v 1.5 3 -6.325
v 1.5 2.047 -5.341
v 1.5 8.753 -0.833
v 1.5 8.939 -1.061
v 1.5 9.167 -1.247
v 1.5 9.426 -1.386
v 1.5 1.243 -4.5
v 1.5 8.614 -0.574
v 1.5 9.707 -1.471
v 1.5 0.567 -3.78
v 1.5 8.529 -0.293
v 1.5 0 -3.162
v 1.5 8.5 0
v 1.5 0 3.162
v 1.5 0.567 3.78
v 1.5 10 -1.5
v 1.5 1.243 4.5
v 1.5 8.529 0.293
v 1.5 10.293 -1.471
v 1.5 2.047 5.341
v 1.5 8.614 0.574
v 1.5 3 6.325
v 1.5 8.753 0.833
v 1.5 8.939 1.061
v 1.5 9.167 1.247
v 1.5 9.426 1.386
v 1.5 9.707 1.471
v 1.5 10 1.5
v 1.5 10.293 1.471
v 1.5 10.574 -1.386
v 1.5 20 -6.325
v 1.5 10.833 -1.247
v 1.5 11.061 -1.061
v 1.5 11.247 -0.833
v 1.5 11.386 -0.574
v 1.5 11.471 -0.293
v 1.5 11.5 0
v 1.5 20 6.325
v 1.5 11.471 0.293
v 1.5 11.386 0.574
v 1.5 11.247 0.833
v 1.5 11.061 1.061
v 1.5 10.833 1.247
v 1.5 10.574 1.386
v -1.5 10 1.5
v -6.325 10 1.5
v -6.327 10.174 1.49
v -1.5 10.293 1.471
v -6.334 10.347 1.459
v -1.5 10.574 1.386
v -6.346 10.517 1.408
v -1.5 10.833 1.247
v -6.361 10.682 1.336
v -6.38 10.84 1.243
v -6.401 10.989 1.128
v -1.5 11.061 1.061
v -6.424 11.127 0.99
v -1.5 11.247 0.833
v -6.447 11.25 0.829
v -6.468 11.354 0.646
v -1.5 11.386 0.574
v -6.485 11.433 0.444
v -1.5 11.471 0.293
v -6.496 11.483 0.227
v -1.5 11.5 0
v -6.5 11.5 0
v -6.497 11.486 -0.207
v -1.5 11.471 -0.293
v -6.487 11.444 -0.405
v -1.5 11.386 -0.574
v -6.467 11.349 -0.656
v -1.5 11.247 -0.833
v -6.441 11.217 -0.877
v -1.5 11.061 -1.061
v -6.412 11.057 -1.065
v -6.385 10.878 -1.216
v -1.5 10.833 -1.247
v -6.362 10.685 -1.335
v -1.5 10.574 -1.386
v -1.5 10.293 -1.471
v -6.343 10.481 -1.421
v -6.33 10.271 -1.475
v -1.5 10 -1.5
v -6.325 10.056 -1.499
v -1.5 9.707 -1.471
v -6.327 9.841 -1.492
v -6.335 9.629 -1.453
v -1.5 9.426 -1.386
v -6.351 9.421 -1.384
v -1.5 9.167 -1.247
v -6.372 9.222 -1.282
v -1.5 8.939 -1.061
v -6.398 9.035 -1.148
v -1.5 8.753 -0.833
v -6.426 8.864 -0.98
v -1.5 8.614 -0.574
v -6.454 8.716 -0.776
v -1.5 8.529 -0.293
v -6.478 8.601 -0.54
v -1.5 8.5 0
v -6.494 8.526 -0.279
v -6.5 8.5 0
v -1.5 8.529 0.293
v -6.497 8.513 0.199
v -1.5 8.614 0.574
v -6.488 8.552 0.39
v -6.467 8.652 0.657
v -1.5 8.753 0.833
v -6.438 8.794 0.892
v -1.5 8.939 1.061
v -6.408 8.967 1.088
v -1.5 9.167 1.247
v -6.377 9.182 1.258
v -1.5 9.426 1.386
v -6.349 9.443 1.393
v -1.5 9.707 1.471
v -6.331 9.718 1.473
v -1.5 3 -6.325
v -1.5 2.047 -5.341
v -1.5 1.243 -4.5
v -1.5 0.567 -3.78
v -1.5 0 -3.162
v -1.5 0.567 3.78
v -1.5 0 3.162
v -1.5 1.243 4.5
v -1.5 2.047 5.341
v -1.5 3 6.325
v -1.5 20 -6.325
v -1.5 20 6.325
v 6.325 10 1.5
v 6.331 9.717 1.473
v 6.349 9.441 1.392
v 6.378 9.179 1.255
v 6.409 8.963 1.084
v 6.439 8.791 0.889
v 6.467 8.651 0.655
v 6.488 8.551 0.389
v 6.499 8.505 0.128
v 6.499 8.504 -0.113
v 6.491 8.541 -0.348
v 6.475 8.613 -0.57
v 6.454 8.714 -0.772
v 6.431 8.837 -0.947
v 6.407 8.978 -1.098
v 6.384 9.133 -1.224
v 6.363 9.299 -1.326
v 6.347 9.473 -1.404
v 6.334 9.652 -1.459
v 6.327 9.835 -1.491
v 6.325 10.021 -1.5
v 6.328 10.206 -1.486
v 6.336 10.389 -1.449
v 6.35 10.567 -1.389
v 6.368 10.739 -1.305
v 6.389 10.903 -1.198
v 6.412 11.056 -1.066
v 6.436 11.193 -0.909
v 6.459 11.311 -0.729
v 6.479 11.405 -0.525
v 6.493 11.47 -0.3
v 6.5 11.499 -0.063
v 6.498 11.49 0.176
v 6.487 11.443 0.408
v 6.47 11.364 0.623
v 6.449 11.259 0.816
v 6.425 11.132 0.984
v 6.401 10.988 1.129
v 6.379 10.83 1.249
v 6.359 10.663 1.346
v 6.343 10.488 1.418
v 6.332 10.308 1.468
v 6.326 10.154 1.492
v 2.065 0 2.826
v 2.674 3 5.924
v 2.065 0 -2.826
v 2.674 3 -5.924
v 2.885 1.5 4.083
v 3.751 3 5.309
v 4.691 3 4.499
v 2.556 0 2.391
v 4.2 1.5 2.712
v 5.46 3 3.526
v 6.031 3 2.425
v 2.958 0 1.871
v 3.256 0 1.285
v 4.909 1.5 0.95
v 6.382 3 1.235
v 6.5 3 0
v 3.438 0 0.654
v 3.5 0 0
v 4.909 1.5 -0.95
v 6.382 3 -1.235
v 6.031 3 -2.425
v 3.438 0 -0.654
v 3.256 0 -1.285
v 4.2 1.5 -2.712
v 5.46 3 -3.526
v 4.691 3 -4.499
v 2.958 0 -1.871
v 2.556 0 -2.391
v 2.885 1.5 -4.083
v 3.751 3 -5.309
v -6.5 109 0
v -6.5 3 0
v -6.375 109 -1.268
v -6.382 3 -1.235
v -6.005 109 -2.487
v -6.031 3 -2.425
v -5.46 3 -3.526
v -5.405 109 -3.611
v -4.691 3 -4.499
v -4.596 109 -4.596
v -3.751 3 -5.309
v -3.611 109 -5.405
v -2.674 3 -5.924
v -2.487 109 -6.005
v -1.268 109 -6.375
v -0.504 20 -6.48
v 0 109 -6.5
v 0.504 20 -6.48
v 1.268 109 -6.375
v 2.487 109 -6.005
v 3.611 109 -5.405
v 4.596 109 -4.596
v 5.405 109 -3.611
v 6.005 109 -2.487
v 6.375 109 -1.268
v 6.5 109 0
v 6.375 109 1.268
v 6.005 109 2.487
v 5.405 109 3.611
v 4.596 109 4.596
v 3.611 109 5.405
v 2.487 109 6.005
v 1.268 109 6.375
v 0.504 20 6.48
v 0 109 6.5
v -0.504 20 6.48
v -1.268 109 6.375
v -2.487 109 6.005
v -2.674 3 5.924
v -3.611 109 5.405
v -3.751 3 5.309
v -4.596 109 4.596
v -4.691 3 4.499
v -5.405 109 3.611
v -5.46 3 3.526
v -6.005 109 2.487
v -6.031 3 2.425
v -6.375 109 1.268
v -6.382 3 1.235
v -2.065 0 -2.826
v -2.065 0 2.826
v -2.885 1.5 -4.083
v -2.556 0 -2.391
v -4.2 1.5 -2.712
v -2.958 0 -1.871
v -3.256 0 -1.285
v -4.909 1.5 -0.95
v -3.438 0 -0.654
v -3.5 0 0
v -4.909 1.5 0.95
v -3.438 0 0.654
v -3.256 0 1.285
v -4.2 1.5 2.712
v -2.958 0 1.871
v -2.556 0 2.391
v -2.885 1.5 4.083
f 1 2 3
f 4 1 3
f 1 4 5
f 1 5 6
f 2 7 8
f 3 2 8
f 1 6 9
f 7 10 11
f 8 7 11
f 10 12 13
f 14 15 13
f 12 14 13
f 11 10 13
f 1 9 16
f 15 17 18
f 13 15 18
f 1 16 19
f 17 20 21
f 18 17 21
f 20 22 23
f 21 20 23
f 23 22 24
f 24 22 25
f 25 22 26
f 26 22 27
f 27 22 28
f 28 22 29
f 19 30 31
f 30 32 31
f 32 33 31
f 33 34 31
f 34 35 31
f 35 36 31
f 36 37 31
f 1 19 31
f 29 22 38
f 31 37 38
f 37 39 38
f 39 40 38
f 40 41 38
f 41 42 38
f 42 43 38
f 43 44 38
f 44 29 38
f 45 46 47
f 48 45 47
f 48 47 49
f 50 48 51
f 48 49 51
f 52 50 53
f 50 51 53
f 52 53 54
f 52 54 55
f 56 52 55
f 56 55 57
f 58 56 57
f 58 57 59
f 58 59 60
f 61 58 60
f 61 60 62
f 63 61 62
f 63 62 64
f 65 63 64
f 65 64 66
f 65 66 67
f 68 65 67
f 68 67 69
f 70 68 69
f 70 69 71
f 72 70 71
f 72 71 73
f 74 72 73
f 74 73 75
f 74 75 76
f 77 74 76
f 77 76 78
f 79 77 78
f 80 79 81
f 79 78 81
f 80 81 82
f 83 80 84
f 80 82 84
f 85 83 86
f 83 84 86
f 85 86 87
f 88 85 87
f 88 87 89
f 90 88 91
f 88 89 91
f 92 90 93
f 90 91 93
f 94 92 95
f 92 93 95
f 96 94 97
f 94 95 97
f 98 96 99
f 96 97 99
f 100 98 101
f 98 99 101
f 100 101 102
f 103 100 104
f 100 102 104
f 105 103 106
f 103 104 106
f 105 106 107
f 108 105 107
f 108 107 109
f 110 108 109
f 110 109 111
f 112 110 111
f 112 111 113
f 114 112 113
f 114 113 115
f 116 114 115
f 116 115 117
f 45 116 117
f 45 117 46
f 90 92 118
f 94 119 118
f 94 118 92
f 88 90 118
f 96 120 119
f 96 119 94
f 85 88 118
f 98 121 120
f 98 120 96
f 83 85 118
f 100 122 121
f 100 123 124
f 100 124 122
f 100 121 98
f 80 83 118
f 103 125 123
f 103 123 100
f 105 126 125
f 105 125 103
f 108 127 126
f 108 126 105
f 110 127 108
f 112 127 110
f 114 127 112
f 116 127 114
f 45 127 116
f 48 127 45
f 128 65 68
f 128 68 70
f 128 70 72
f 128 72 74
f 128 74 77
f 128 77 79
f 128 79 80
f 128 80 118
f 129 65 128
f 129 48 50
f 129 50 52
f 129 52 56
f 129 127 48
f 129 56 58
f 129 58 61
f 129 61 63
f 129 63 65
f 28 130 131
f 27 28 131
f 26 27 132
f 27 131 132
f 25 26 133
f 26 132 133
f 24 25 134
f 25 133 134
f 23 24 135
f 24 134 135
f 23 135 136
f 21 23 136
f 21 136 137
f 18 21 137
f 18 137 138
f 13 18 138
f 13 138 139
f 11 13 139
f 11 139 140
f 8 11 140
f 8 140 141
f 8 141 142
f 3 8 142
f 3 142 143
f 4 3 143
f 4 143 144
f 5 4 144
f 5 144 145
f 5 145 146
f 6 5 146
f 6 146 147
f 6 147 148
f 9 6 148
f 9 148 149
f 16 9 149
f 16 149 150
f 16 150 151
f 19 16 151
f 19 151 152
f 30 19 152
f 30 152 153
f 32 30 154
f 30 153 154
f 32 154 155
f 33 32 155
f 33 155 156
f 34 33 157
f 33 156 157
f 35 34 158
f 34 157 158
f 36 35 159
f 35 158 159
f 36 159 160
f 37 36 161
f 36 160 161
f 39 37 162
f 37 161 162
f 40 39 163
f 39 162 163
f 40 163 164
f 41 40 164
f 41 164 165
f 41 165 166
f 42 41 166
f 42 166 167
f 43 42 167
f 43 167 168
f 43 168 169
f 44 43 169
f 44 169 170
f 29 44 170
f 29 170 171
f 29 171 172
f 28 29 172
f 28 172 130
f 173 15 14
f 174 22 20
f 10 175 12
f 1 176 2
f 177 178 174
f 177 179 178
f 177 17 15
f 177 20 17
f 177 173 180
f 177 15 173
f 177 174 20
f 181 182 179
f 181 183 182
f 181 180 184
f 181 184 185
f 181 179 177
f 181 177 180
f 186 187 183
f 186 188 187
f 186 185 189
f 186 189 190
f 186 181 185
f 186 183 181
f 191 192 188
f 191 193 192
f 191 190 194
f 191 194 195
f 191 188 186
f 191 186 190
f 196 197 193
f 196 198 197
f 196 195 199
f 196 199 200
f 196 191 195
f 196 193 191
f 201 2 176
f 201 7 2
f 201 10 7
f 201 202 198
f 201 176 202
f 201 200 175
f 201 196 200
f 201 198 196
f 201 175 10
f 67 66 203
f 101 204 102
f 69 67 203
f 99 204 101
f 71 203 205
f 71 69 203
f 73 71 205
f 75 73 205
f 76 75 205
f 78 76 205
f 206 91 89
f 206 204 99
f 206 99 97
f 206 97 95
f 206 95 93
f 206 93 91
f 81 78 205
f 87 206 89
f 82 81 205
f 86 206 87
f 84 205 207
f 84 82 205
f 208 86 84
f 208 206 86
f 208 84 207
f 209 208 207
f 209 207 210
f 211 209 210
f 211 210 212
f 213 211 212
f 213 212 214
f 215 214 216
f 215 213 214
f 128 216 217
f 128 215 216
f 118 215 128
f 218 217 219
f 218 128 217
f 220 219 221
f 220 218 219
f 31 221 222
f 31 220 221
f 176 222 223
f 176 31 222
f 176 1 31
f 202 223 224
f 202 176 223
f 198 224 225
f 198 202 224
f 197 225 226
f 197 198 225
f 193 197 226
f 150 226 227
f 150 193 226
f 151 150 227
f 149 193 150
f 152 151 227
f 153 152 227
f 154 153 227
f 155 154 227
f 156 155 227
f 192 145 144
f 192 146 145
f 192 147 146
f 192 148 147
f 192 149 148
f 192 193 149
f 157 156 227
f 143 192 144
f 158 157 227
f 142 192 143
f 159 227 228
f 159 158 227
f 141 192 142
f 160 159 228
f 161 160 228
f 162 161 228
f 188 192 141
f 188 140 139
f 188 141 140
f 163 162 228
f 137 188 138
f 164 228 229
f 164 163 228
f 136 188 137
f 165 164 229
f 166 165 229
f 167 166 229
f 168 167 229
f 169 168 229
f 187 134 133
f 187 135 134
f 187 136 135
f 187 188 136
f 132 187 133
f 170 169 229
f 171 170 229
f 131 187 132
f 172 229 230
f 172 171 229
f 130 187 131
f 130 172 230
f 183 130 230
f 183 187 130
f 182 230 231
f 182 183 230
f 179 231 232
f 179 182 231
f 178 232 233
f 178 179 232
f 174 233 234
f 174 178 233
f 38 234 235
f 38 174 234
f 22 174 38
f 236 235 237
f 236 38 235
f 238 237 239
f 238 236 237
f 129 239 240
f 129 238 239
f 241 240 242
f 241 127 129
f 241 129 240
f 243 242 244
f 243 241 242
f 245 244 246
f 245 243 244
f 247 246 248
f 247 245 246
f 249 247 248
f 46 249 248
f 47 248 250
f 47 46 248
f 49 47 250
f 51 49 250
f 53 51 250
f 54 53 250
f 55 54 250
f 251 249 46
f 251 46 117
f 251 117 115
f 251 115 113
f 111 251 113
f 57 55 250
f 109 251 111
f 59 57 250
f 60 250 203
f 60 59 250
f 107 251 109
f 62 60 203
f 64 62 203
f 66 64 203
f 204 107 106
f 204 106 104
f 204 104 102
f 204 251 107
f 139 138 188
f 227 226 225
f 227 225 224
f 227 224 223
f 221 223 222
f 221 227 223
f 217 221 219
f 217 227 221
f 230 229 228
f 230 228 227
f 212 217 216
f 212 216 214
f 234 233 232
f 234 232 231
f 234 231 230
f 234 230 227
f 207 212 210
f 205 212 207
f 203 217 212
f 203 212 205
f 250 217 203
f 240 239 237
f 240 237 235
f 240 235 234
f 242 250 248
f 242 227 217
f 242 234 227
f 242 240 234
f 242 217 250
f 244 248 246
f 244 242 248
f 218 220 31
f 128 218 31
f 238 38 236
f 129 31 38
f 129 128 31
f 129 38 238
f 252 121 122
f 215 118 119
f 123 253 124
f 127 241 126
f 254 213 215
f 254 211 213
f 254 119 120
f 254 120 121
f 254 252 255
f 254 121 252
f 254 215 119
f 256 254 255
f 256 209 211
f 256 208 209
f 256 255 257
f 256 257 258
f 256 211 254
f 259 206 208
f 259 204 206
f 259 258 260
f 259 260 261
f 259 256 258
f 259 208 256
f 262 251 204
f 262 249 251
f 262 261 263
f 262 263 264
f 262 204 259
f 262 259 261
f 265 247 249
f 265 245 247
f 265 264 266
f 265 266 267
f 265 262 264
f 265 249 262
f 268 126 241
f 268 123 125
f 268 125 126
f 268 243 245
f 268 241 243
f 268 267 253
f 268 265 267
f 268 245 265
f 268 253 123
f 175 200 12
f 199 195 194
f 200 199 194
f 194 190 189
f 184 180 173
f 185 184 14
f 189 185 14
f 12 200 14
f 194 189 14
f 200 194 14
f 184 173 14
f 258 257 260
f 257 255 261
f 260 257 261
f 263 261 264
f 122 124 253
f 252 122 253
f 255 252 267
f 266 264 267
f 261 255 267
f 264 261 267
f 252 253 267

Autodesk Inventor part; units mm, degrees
ref_plane "YZ Plane" through (0, 0, 0) normal (1, 0, 0) x (0, 1, 0)
ref_plane "XZ Plane" through (0, 0, 0) normal (0, 1, 0) x (-1, 0, 0)
ref_plane "XY Plane" through (0, 0, 0) normal (0, 0, 1) x (1, 0, 0)
sketch "Sketch1" plane through (0, 0, 0) normal (0, 1, 0) x (-1, 0, 0)
  circle A0 centre (0, 0) radius 6.5
  dimension "d0" = 13
extrude "Extrusion1" add sketch "Sketch1" along normal blind 109
chamfer "Chamfer1" distance 3 angle 45 1 edges at (6.5, 0, 0)
sketch "Sketch2" plane through (0, 0, 0) normal (1, 0, 0) x (0, 1, 0)
  line L0 (20, 11.2856) -> (-12.0513, 11.2856)
  line L1 (-12.0513, 11.2856) -> (-12.0513, -8.7625)
  line L2 (-12.0513, -8.7625) -> (20, -8.7625)
  line L3 (20, -8.7625) -> (20, 11.2856)
  line L4 (109, -6.5) -> (109, 6.5) construction
  line L5 (3, 6.5) -> (3, -6.5) construction
  line L6 (0, -3.5) -> (0, 3.5) construction
  point P0 (0, 0)
  dimension "d6" = 20
extrude "Extrusion2" cut sketch "Sketch2" along normal mid plane 3
sketch "Sketch3" plane through (0, 0, 0) normal (1, 0, 0) x (0, 1, 0)
  line L0 (-21.8, 0) -> (130.8, 0) construction
  line L1 (0, -3.1623) -> (0, 3.1623) construction
  point P0 (0, 0)
  point P1 (10, 0)
  dimension "d9" = 10
hole "Hole1" at (0, 10, 0) direction (1, 0, 0) diameter 3 end through all
mirror "Mirror1" about plane through (0, 0, 0) normal (1, 0, 0) of "Hole1"
properties part number "LIVER SHAFT" material "Steel, Alloy"
